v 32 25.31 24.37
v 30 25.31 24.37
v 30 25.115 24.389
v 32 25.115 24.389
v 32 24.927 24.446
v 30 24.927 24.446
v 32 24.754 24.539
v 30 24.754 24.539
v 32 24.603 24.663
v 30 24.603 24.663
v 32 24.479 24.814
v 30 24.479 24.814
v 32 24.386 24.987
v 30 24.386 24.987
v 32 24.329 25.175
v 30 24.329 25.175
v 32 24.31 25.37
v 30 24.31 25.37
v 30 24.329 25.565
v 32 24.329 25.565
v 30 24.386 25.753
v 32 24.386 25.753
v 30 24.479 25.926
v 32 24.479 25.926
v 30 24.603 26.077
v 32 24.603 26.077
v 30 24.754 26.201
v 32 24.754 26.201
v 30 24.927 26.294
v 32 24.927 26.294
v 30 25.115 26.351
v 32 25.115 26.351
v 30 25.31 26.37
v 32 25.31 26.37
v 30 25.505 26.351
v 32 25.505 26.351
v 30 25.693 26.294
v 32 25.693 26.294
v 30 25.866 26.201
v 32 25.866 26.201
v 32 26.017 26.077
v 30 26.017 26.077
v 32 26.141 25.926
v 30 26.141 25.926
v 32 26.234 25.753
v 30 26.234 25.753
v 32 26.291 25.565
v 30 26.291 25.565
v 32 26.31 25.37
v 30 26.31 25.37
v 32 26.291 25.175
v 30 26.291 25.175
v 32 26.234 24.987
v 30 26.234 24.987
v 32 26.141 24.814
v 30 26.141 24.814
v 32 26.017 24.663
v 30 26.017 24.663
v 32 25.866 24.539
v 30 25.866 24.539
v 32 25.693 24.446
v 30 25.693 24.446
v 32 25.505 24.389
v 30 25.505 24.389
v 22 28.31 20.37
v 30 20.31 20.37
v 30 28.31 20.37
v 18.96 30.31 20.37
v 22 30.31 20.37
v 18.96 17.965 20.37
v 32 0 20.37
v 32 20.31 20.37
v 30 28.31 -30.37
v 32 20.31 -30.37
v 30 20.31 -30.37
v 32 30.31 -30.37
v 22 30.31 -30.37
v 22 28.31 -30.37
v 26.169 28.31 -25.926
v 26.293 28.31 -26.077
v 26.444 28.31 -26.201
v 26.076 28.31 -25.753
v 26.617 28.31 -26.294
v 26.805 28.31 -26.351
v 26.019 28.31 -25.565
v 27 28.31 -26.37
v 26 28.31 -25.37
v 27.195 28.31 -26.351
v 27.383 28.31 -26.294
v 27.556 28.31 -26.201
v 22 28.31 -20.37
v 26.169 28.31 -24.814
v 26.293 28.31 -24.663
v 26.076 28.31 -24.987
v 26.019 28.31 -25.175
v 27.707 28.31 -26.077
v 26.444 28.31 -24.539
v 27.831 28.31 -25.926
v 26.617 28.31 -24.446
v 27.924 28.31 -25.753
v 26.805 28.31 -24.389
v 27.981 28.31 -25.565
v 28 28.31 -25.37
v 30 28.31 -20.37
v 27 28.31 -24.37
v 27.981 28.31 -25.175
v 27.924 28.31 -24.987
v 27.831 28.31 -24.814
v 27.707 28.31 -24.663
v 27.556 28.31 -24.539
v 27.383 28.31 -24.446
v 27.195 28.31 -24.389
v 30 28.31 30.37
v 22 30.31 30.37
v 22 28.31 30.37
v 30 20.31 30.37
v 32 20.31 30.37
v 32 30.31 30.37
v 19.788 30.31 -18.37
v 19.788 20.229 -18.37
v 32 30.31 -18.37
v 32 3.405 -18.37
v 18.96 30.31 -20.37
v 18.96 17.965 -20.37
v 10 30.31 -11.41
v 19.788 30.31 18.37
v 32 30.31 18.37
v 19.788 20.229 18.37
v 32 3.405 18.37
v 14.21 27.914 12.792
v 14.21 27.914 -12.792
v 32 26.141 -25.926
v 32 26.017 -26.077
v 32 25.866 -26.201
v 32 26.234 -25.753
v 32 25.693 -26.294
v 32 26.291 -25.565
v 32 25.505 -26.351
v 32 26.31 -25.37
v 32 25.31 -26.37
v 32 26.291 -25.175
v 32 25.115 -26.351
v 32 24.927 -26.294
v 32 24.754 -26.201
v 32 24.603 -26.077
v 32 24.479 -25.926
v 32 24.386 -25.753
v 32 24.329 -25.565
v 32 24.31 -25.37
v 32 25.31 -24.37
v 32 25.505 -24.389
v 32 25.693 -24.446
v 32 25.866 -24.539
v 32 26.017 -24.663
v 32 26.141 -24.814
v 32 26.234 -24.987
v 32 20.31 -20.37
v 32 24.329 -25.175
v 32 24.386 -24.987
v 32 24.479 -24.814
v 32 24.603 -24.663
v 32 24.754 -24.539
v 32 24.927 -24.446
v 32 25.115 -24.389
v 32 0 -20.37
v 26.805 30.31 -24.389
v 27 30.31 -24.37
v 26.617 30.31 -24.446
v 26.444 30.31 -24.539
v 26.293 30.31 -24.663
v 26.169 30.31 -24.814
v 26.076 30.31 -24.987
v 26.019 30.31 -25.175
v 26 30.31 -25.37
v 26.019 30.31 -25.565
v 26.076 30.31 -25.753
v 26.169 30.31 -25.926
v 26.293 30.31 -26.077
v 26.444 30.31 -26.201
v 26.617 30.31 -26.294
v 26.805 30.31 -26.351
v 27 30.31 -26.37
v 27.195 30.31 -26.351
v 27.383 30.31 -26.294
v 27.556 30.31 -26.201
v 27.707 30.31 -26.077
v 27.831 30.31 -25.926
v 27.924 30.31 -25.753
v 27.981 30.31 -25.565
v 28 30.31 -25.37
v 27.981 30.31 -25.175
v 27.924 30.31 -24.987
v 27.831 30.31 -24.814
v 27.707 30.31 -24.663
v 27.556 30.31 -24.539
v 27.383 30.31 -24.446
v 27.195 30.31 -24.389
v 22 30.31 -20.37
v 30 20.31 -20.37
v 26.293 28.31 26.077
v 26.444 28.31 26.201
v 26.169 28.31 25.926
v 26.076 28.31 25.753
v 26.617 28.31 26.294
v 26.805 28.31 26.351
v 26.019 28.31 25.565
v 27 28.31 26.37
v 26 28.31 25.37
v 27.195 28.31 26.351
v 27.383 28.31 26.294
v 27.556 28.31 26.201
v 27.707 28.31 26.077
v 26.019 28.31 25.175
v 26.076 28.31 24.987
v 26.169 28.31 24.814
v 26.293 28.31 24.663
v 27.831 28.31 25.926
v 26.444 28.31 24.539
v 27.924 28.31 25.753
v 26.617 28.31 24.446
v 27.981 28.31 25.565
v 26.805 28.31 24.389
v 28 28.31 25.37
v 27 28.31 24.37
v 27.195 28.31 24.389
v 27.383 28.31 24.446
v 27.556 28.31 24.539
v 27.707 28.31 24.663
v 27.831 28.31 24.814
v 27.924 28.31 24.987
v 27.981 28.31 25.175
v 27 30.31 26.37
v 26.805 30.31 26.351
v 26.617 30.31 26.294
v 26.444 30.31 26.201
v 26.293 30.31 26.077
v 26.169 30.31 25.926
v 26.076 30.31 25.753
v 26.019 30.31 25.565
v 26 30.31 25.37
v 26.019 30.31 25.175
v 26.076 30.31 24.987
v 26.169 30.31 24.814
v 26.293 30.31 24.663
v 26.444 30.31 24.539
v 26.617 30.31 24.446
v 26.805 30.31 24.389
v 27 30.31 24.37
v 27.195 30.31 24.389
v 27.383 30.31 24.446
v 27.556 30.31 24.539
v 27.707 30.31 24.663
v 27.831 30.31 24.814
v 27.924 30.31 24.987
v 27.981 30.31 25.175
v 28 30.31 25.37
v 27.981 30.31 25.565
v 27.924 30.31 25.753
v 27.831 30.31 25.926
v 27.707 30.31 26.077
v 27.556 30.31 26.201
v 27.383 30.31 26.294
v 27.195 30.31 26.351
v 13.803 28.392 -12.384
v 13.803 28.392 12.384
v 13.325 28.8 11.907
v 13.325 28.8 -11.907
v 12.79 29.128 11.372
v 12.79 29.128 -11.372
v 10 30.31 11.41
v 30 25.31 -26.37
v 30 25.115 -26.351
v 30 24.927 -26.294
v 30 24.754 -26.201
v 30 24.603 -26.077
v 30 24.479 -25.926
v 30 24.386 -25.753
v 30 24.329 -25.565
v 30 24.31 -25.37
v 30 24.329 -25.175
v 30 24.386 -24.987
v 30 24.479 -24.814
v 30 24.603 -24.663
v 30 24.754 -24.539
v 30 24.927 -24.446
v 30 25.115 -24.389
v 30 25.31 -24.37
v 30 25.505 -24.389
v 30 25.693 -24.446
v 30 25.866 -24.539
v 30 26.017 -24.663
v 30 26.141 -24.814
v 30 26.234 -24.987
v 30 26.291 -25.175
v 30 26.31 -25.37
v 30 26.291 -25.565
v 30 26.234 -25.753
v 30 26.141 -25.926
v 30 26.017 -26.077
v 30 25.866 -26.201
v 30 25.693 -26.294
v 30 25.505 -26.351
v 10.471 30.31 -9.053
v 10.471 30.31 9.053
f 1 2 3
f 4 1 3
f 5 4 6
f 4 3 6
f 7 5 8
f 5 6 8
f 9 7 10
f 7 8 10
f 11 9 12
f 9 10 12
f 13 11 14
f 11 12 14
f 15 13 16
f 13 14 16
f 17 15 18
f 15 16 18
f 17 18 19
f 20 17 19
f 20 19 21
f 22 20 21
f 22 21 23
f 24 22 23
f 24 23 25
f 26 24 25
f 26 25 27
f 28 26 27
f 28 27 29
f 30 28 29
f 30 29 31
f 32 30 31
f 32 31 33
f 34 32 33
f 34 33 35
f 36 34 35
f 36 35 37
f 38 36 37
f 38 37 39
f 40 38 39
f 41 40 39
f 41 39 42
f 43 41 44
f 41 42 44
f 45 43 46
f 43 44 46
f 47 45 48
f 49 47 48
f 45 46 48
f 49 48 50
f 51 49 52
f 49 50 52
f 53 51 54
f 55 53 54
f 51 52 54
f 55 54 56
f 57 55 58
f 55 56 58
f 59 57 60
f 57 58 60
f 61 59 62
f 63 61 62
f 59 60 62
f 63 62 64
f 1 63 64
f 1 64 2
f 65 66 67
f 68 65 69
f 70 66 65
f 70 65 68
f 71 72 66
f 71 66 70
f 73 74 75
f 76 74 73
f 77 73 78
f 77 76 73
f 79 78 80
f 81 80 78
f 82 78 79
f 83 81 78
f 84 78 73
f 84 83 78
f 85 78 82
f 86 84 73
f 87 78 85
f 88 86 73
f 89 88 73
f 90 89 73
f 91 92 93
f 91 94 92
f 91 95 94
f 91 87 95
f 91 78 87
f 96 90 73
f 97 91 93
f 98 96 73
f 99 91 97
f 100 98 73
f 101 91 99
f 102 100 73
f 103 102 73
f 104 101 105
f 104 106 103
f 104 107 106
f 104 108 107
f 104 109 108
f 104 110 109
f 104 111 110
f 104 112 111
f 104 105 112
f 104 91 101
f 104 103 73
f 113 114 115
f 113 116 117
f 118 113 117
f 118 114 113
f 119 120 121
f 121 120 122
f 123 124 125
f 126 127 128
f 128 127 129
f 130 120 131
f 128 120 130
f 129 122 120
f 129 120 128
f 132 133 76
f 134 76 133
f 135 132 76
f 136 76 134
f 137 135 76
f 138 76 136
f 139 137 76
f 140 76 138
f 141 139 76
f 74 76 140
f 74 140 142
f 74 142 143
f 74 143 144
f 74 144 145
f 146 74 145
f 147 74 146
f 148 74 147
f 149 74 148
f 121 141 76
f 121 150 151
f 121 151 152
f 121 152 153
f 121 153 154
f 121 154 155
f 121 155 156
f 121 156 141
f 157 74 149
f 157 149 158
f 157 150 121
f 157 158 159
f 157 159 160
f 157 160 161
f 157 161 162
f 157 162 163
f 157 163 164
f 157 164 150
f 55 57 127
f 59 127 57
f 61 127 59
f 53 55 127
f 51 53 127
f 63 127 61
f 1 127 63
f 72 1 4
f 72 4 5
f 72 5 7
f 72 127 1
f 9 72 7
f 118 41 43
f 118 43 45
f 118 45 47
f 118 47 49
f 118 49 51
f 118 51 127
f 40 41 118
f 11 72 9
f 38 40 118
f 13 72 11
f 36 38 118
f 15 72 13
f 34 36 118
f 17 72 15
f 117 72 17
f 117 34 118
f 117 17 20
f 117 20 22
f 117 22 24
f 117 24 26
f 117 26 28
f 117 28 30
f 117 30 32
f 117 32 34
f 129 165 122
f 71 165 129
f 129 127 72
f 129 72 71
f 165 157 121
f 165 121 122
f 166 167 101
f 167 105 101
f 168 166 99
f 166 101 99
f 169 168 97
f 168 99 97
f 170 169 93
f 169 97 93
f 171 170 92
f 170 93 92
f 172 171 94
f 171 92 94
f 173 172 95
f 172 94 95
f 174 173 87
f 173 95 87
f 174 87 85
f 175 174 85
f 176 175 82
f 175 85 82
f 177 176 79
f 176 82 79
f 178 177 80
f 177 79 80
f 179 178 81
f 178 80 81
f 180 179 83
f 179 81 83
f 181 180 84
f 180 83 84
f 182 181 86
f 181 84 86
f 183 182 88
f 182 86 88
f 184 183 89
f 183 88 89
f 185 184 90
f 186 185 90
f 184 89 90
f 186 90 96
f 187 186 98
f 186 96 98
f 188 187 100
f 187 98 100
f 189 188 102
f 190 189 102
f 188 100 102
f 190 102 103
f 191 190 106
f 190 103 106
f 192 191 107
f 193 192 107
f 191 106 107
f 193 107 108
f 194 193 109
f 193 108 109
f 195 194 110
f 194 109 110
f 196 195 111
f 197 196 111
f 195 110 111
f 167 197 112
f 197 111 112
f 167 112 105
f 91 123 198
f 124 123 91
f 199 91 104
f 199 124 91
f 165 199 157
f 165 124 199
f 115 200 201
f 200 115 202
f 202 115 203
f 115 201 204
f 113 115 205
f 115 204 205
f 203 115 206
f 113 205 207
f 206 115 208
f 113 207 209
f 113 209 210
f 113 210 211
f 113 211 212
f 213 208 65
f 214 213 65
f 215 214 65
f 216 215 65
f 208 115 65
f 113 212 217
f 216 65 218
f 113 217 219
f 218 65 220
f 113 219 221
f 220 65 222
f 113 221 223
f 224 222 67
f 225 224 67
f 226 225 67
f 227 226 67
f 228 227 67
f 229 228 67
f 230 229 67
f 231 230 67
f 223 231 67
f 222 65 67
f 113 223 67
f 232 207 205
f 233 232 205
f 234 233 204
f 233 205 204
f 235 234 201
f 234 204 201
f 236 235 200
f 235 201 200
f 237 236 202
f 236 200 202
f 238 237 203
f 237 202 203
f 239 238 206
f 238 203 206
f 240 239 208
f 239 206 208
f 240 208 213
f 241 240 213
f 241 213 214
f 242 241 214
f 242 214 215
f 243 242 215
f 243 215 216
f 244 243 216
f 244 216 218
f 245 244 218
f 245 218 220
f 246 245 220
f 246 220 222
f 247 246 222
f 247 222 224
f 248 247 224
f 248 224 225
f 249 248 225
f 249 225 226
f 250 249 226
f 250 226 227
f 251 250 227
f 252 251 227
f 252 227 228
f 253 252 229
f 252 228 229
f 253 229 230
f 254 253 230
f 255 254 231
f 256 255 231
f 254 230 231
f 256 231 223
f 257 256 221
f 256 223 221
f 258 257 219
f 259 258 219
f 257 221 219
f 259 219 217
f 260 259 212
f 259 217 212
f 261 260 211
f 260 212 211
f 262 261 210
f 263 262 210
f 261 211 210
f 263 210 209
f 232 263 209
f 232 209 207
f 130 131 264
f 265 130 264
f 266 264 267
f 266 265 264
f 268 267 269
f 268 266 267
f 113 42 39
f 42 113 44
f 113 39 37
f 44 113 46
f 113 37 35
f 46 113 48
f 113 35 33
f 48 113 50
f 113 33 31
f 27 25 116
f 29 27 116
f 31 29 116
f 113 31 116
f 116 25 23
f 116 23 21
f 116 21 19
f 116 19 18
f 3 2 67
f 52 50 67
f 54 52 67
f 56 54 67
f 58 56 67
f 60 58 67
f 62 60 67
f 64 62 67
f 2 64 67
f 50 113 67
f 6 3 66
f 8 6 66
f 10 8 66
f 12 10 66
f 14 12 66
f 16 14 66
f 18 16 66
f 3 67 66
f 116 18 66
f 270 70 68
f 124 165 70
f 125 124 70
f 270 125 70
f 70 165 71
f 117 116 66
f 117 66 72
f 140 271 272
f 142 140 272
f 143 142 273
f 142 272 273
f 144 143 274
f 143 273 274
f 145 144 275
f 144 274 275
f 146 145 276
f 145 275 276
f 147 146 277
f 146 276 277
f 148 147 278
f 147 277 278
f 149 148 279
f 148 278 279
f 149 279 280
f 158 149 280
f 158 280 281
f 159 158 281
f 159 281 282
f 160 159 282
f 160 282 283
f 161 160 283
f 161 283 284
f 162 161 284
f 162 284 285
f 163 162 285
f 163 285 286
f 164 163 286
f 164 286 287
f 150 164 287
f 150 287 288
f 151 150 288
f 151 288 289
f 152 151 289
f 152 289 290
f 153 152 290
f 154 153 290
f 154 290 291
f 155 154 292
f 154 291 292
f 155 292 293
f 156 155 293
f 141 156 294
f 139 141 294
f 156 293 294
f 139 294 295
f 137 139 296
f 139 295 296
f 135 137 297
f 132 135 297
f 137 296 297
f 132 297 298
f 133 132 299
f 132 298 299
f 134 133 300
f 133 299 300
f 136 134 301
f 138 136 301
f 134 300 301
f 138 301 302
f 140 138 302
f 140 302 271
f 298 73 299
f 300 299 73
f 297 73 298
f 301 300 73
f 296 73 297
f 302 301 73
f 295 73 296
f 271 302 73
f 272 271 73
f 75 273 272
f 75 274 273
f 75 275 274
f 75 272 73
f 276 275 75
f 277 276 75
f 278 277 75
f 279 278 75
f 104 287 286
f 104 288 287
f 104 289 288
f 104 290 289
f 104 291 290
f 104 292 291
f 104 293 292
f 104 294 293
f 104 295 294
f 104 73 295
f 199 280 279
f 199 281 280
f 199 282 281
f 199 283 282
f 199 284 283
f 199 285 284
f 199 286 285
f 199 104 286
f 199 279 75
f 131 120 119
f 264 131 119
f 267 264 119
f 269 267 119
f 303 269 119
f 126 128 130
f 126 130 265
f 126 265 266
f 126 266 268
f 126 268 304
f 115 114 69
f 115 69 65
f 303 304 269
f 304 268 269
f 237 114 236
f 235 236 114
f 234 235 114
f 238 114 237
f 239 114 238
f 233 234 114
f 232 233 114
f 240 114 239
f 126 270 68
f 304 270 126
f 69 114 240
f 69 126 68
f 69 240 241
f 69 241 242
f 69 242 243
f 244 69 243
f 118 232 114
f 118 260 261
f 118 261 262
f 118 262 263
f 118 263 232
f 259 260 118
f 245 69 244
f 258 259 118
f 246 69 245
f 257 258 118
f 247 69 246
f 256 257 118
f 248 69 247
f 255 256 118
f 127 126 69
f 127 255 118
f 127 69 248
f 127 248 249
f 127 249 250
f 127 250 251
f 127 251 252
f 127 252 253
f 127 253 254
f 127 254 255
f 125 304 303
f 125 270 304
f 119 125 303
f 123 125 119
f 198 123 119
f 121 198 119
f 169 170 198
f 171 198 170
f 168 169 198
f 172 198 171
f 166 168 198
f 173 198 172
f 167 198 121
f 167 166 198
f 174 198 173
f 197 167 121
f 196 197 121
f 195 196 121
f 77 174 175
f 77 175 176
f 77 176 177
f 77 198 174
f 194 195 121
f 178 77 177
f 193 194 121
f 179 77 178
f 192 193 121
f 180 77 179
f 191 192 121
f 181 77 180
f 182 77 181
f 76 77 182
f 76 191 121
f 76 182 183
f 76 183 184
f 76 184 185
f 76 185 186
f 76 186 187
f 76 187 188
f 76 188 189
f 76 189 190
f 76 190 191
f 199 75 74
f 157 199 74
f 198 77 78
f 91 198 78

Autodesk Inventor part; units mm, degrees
ref_plane "YZ Plane" through (0, 0, 0) normal (1, 0, 0) x (0, 1, 0)
ref_plane "XZ Plane" through (0, 0, 0) normal (0, 1, 0) x (-1, 0, 0)
ref_plane "XY Plane" through (0, 0, 0) normal (0, 0, 1) x (1, 0, 0)
sketch "Boceto1" plane through (0, 0, 0) normal (0, 1, 0) x (-1, 0, 0)
  line L0 (-18.96, -20.37) -> (-32, -20.37)
  line L1 (-32, -20.37) -> (-32, 20.37)
  line L2 (-32, 20.37) -> (-18.96, 20.37)
  line L3 (-18.96, 20.37) -> (-10, 11.41)
  line L4 (-18.96, -20.37) -> (-10, -11.41)
  line L5 (-10, 0) -> (-10, 14.0554)
  line L6 (-10, 0) -> (4.0554, 0) construction
  line L7 (-10, 14.0554) -> (-10, -14.0554)
  dimension "d15" = 13.04
  dimension "d16" = 40.74
  dimension "d17" = 13.04
  dimension "d108" = 90
extrude "Extrusión1" add sketch "Boceto1" along normal blind 20.31
sketch "Boceto7" plane through (0, 20.31, 0) normal (0, 1, 0) x (1, 0, 0)
  line L0 (6.8202, -5.4018) -> (6.8202, 5.4018) projected
  line L1 (32, -20.37) -> (32, 20.37) projected
  line L2 (32, 20.37) -> (18.96, 20.37) projected
  line L3 (18.96, 20.37) -> (10, 11.41) projected
  line L4 (10, -11.41) -> (18.96, -20.37) projected
  line L5 (18.96, -20.37) -> (32, -20.37) projected
  line L6 (10, 11.41) -> (10, -11.41) projected
  point P0 (0, 0)
extrude "Extrusión5" add sketch "Boceto7" along normal blind 10
chamfer "Chaflán2" distance 30.31 distance2 22 1 edges at (10, 0, 0) measured on face at (10, 10.1033, -3.8033)
shell "Vaciado2" thickness 2 removed faces 3 at (24.6667, 30.31, 3.8033) at (32, 0, 6.79) at (32, 10.1033, 6.79)
chamfer "Chaflán3" distance 2 angle 45 1 edges at (12.4712, 30.31, 0)
fillet "Empalme2" radius 4 1 edges at (13.646, 28.6914, 0)
sketch "Boceto13" plane through (18.96, 30.31, 20.37) normal (0, 0, 1) x (1, 0, 0)
  line L0 (13.04, 0) -> (3.04, 0)
  line L1 (3.04, 0) -> (3.04, -2)
  line L2 (3.04, -2) -> (13.04, -2)
  line L3 (13.04, -2) -> (13.04, 0)
  line L4 (13.04, 0) -> (11.04, 0)
  line L5 (11.04, 0) -> (11.04, -10)
  line L6 (11.04, -10) -> (13.04, -10)
  line L7 (13.04, -10) -> (13.04, 0)
  point P0 (-18.96, -30.31)
  point P1 (11.04, -2)
  point P2 (13.04, -2)
  dimension "d123" = 10
  dimension "d124" = 2
  dimension "d125" = 2
  dimension "d126" = 10
extrude "Extrusión9" add sketch "Boceto13" along normal blind 10
sketch "Boceto14" plane through (32, 30.31, -20.37) normal (0, 0, -1) x (-1, 0, 0)
  line L0 (0, -26.9052) -> (0, 0) projected
  line L1 (0, 0) -> (10, 0)
  line L2 (10, 0) -> (10, -2)
  line L3 (10, -2) -> (0, -2)
  line L4 (0, -2) -> (0, 0)
  line L5 (0, 0) -> (12.2116, 0) projected
  line L6 (0, 0) -> (2, 0)
  line L7 (2, 0) -> (2, -10)
  line L8 (2, -10) -> (0, -10)
  line L9 (0, -10) -> (0, 0)
  point P0 (32, -30.31)
  point P1 (2, -2)
  dimension "d129" = 10
  dimension "d130" = 2
  dimension "d131" = 2
  dimension "d132" = 10
extrude "Extrusión10" add sketch "Boceto14" along normal blind 10
sketch "Boceto15" plane through (32, 0, 20.37) normal (1, 0, 0) x (0, 0, -1)
  line L0 (2, 30.31) -> (-10, 30.31) projected
  line L1 (-10, 20.31) -> (-10, 30.31) projected
  line L2 (38.74, 30.31) -> (50.74, 30.31) projected
  line L3 (50.74, 30.31) -> (50.74, 20.31) projected
  point P0 (20.37, 0)
  point P1 (-5, 25.31)
  point P2 (45.74, 25.31)
  dimension "d135" = 5
  dimension "d136" = 5
  dimension "d144" = 5
  dimension "d145" = 5
hole "Agujero5" at (32, 25.31, 25.37) at (32, 25.31, -25.37) direction (-1, 0, 0) diameter 2 depth 2.5 tip angle 118
sketch "Boceto16" plane through (0, 30.31, 0) normal (0, 1, 0) x (1, 0, 0)
  line L0 (32, -30.37) -> (22, -30.37) projected
  line L1 (22, -20.37) -> (22, -30.37) projected
  line L2 (22, 30.37) -> (32, 30.37) projected
  line L3 (22, 20.37) -> (22, 30.37) projected
  point P0 (0, 0)
  point P1 (27, -25.37)
  point P2 (27, 25.37)
  dimension "d146" = 5
  dimension "d147" = 5
  dimension "d148" = 5
  dimension "d149" = 5
hole "Agujero6" at (27, 30.31, 25.37) at (27, 30.31, -25.37) direction (0, -1, 0) diameter 2 depth 2.5 tip angle 118
properties part number "Rampa2"
